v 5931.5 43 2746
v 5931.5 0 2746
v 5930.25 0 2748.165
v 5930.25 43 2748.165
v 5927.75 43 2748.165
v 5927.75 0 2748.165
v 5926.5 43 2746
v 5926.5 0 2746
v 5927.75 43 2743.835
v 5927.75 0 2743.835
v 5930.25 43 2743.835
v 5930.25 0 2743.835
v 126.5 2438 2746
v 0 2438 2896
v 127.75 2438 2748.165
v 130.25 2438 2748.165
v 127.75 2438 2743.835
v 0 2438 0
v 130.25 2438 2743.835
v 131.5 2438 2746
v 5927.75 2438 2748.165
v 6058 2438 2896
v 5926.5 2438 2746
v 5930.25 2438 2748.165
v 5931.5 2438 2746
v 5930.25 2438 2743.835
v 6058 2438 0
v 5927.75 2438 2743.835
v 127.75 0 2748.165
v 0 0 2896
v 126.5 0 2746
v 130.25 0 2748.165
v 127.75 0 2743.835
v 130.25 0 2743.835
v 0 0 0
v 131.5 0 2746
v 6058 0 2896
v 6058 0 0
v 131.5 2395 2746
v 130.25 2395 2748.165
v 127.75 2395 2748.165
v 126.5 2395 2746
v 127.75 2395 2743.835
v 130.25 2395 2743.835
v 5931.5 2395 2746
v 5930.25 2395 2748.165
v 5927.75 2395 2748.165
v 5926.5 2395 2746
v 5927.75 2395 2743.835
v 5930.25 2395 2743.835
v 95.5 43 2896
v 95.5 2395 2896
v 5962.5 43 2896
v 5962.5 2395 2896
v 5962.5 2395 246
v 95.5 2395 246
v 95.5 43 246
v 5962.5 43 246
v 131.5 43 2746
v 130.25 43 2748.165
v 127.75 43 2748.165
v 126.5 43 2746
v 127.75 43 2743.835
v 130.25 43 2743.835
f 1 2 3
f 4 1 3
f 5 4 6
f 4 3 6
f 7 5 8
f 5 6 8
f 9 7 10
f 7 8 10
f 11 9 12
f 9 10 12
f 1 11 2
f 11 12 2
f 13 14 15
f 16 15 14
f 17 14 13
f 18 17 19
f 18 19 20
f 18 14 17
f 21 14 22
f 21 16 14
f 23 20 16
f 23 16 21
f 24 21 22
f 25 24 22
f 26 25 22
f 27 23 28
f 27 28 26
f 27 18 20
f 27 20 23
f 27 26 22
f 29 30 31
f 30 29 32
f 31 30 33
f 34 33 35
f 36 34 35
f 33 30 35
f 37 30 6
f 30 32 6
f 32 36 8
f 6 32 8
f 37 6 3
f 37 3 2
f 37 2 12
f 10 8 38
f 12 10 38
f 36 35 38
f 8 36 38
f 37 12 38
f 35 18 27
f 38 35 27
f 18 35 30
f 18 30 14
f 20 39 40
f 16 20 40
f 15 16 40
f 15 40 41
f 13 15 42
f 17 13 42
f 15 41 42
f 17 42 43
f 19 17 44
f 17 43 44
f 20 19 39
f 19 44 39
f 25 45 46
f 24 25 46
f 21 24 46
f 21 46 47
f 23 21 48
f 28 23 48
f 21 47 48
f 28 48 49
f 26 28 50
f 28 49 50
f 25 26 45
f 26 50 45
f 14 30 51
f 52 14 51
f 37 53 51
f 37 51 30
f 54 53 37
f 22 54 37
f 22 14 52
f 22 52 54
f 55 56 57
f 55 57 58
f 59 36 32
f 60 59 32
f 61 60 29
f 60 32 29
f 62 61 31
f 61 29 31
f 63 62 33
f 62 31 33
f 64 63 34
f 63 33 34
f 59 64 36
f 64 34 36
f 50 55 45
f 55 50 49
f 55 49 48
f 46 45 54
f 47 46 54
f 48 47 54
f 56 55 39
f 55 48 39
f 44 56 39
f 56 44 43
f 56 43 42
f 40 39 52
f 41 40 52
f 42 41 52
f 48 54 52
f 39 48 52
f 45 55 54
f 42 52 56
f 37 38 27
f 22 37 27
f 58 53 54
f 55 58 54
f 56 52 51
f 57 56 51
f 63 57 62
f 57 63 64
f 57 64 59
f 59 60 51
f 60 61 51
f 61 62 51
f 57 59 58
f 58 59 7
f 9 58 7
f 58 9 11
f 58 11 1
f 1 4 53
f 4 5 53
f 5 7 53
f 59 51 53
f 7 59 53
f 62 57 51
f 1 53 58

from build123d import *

# Parameters (mm, degrees)
F0_W     = 6058
F0_H     = 2438
F1_DEPTH = 2896
F3_DEPTH = 2650
F5_DEPTH = 2438.001


with BuildPart() as f1:
    # F0 (on Top) → F1 (new body)
    with BuildSketch(Plane.XY):
        with Locations((3029, 1219)):
            Rectangle(F0_W, F0_H)
    extrude(amount=F1_DEPTH)

    # F2 (on face) → F3 (cut)
    with BuildSketch(Plane.XY.offset(2896)):
        Polygon((3029, 2395), (95.5, 2395), (95.5, 1219), (95.5, 43), (3029, 43), (5962.5, 43), (5962.5, 1219), (5962.5, 2395), align=None)
    extrude(amount=-F3_DEPTH, mode=Mode.SUBTRACT)

    # F4 (on face) → F5 (cut, through all)
    with BuildSketch(Plane.XZ):
        with BuildLine():
            Line((131.5, 2746), (129, 2746))
            Line((129, 2746), (126.5, 2746))
            ThreePointArc((126.5, 2746), (129, 2743.5), (131.5, 2746))
        make_face()
        with BuildLine():
            Line((126.5, 2746), (129, 2746))
            Line((129, 2746), (131.5, 2746))
            ThreePointArc((131.5, 2746), (129, 2748.5), (126.5, 2746))
        make_face()
        with BuildLine():
            Line((5929, 2746), (5926.5, 2746))
            ThreePointArc((5926.5, 2746), (5929, 2743.5), (5931.5, 2746))
            Line((5931.5, 2746), (5929, 2746))
        make_face()
        with BuildLine():
            ThreePointArc((5931.5, 2746), (5929, 2748.5), (5926.5, 2746))
            Line((5926.5, 2746), (5929, 2746))
            Line((5929, 2746), (5931.5, 2746))
        make_face()
    extrude(amount=-F5_DEPTH, mode=Mode.SUBTRACT)


solid = f1.part
